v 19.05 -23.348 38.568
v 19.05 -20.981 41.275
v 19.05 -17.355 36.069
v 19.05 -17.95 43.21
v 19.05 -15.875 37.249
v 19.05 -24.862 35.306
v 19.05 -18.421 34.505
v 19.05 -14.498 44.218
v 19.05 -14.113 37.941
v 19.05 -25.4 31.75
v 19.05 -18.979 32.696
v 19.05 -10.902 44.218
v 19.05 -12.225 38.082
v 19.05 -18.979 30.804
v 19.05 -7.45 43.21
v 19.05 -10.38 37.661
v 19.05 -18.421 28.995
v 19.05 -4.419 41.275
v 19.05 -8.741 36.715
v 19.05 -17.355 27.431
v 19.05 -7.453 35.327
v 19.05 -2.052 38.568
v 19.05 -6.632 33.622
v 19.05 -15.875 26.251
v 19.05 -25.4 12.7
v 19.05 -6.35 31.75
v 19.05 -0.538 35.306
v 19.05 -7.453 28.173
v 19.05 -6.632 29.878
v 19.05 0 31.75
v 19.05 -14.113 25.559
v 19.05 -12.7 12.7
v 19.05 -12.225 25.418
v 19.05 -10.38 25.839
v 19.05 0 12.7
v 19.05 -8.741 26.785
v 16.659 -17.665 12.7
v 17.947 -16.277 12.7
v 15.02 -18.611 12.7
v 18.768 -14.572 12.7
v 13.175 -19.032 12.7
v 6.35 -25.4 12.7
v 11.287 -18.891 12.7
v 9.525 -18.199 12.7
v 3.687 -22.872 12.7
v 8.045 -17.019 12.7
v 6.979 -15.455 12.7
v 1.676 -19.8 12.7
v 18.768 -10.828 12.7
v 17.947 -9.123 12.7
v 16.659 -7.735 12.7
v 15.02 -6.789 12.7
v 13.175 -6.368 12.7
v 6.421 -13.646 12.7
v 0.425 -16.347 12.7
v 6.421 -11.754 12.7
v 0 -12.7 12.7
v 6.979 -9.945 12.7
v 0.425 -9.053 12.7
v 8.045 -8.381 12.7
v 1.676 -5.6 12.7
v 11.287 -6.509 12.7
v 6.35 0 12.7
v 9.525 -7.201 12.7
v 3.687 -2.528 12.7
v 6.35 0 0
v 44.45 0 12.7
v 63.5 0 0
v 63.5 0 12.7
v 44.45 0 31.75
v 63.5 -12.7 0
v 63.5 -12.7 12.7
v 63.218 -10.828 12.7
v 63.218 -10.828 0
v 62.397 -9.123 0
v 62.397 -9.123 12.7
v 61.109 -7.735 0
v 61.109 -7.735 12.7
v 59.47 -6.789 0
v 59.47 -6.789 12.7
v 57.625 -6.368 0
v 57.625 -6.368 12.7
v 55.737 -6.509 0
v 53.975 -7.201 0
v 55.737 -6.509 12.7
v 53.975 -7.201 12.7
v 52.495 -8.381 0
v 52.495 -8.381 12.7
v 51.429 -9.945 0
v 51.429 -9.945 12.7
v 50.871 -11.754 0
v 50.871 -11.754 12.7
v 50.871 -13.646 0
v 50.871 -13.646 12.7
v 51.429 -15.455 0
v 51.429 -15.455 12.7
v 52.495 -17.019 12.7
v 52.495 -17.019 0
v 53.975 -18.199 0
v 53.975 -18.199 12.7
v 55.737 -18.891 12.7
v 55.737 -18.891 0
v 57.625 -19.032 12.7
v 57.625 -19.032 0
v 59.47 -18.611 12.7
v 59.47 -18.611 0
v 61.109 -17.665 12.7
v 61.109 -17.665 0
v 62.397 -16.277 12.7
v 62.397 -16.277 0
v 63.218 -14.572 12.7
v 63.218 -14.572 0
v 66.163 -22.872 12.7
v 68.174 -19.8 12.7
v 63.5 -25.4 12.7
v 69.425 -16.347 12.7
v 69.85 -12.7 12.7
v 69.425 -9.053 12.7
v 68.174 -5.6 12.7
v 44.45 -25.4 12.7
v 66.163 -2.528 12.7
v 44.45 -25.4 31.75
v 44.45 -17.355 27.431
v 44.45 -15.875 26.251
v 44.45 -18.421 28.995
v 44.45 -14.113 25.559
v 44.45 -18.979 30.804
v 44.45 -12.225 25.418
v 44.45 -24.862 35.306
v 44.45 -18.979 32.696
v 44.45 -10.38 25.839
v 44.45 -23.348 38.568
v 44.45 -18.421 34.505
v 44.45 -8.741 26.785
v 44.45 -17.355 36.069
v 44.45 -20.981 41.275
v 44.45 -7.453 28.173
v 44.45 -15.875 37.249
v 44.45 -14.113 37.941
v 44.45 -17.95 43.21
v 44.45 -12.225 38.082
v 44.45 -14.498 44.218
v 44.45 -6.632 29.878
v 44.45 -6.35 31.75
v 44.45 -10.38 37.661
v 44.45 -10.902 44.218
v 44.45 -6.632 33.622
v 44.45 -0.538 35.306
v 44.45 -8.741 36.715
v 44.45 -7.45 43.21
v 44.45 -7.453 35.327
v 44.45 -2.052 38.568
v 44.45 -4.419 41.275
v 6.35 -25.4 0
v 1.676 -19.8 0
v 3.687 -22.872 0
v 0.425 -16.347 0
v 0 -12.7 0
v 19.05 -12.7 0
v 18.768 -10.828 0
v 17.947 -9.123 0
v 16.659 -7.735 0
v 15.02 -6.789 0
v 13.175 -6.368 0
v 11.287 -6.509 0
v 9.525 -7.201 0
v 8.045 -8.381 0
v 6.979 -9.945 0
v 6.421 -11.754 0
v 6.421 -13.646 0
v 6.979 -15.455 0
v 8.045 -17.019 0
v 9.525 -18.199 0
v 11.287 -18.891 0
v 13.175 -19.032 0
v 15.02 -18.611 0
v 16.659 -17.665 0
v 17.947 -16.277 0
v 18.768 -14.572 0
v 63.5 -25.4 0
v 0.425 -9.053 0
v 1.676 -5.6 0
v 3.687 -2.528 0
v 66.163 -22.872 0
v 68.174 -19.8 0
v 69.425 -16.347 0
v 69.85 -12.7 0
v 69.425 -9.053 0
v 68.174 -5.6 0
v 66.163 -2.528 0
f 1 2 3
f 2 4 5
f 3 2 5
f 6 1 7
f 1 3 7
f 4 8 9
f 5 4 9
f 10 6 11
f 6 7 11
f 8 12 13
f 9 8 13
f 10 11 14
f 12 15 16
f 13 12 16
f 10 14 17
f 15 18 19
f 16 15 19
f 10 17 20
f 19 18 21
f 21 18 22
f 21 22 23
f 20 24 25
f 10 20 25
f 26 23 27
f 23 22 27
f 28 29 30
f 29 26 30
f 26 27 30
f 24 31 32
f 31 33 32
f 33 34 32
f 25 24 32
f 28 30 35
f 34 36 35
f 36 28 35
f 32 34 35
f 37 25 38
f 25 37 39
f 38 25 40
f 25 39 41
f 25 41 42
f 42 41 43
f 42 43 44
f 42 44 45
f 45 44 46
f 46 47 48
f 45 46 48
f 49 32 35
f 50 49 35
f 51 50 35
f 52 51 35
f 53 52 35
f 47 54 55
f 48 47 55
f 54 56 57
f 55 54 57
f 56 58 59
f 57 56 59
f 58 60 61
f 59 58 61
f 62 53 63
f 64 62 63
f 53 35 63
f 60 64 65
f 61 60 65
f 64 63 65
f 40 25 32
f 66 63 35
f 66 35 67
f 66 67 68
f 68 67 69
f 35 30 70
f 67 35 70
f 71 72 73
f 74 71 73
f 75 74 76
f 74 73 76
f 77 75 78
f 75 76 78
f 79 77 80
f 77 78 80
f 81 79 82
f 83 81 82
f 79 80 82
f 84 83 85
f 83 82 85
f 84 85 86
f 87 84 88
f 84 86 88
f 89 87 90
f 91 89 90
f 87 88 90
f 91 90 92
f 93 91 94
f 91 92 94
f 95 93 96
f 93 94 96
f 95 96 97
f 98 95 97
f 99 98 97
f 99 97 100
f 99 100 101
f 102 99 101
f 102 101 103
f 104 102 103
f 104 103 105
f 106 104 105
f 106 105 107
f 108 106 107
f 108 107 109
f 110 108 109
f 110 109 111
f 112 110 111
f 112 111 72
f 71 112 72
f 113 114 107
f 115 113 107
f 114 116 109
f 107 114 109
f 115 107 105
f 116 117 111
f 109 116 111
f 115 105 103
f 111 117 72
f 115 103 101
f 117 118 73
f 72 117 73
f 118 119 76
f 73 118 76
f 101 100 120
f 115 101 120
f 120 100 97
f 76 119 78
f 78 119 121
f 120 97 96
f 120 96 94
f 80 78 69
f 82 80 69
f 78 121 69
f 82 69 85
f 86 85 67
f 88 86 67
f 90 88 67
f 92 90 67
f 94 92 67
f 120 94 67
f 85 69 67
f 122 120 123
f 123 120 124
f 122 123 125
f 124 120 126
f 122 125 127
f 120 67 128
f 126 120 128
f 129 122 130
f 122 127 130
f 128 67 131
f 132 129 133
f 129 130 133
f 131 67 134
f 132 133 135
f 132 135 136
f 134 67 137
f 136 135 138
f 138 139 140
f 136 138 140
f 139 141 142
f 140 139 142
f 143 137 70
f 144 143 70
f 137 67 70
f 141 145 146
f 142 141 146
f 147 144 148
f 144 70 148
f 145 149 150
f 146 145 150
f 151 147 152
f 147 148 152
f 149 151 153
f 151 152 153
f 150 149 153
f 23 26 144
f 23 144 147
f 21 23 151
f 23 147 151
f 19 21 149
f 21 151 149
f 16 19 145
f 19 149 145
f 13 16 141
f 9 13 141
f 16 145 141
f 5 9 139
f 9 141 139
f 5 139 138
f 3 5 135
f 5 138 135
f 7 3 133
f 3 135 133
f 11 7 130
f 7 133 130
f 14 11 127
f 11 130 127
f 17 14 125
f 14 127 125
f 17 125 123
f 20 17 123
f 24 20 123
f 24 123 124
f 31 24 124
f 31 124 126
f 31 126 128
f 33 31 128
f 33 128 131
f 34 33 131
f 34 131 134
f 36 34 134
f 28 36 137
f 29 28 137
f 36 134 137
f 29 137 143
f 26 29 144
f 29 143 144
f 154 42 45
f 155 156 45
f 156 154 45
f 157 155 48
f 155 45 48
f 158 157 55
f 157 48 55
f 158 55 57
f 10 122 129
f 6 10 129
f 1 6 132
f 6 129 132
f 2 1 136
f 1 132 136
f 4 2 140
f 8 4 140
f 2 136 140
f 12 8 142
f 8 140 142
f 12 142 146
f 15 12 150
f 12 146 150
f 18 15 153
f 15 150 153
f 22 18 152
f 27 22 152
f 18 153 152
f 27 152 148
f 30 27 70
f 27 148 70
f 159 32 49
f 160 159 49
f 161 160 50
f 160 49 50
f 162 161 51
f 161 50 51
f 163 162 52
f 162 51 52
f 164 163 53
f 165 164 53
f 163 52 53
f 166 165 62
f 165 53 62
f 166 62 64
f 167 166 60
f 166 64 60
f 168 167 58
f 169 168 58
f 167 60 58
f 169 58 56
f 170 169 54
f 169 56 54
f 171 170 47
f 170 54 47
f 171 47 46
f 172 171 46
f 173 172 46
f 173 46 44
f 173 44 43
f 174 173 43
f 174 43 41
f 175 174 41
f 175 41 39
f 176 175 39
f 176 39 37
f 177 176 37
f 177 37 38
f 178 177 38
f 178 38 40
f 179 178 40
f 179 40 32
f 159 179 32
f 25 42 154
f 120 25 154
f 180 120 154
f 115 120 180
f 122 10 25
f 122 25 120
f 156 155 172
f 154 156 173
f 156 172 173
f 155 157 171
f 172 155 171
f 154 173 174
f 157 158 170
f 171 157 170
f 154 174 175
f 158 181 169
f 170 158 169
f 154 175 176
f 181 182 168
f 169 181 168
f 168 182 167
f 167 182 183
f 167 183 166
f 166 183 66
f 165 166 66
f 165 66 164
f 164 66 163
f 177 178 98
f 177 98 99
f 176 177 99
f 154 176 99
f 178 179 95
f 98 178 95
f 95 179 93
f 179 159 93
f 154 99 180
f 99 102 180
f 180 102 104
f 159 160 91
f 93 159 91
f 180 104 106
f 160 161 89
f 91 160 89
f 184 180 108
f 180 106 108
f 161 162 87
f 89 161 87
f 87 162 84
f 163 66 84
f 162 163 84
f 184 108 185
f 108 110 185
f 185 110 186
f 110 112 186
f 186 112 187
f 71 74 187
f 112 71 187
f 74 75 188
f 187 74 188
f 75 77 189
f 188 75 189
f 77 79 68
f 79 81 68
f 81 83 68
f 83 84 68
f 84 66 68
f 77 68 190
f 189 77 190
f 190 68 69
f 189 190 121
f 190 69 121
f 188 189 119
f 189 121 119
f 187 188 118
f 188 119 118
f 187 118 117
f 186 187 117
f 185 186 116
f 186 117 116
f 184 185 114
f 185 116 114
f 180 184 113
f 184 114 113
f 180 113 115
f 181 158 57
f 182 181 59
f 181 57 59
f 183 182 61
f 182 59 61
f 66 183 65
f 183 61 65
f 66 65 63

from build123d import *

# Parameters (mm, degrees)
F1_DEPTH = 25.4
F2_R     = 6.35
F3_DEPTH = 25.4
F5_DEPTH = 25.4
F6_R     = 6.35
F7_DEPTH = 25.4


with BuildPart() as f1:
    # F0 (on Front) → F1 (new body)
    with BuildSketch(Plane.XZ):
        Polygon((0, 12.7), (0, 0), (69.85, 0), (69.85, 12.7), (44.45, 12.7), (44.45, 44.45), (19.05, 44.45), (19.05, 12.7), align=None)
    extrude(amount=F1_DEPTH)

    # F2 (on face) → F3 (cut)
    with BuildSketch(Plane.XY.offset(12.7)):
        with Locations((12.7, -12.7)):
            Circle(F2_R)
        with Locations((57.15, -12.7)):
            Circle(F2_R)
        with BuildLine():
            ThreePointArc((69.85, -12.7), (68.1740316571, -19.7995158286), (63.5, -25.4))
            Line((63.5, -25.4), (69.85, -25.4))
            Line((69.85, -25.4), (69.85, -12.7))
        make_face()
        with BuildLine():
            ThreePointArc((63.5, 0), (68.1740316571, -5.6004841714), (69.85, -12.7))
            Line((69.85, -12.7), (69.85, 0))
            Line((69.85, 0), (63.5, 0))
        make_face()
    extrude(amount=-F3_DEPTH, mode=Mode.SUBTRACT)

    # F4 (on face) → F5 (cut)
    with BuildSketch(Plane.XY.offset(12.7)):
        with BuildLine():
            ThreePointArc((0, -12.7), (1.6759683429, -5.6004841714), (6.35, 0))
            Line((6.35, 0), (0, 0))
            Line((0, 0), (0, -12.7))
        make_face()
        with BuildLine():
            ThreePointArc((6.35, -25.4), (1.6759683429, -19.7995158286), (0, -12.7))
            Line((0, -12.7), (0, -25.4))
            Line((0, -25.4), (6.35, -25.4))
        make_face()
    extrude(amount=-F5_DEPTH, mode=Mode.SUBTRACT)

    # F6 (on face) → F7 (cut)
    with BuildSketch(Plane.YZ.offset(44.45)):
        with BuildLine():
            ThreePointArc((-25.4, 31.75), (-12.7, 44.3458432454), (0, 31.75))
            Line((0, 31.75), (0, 44.45))
            Line((0, 44.45), (-25.4, 44.45))
            Line((-25.4, 44.45), (-25.4, 31.75))
        make_face()
        with Locations((-12.7, 31.75)):
            Circle(F6_R)
    extrude(amount=-F7_DEPTH, mode=Mode.SUBTRACT)


solid = f1.part
